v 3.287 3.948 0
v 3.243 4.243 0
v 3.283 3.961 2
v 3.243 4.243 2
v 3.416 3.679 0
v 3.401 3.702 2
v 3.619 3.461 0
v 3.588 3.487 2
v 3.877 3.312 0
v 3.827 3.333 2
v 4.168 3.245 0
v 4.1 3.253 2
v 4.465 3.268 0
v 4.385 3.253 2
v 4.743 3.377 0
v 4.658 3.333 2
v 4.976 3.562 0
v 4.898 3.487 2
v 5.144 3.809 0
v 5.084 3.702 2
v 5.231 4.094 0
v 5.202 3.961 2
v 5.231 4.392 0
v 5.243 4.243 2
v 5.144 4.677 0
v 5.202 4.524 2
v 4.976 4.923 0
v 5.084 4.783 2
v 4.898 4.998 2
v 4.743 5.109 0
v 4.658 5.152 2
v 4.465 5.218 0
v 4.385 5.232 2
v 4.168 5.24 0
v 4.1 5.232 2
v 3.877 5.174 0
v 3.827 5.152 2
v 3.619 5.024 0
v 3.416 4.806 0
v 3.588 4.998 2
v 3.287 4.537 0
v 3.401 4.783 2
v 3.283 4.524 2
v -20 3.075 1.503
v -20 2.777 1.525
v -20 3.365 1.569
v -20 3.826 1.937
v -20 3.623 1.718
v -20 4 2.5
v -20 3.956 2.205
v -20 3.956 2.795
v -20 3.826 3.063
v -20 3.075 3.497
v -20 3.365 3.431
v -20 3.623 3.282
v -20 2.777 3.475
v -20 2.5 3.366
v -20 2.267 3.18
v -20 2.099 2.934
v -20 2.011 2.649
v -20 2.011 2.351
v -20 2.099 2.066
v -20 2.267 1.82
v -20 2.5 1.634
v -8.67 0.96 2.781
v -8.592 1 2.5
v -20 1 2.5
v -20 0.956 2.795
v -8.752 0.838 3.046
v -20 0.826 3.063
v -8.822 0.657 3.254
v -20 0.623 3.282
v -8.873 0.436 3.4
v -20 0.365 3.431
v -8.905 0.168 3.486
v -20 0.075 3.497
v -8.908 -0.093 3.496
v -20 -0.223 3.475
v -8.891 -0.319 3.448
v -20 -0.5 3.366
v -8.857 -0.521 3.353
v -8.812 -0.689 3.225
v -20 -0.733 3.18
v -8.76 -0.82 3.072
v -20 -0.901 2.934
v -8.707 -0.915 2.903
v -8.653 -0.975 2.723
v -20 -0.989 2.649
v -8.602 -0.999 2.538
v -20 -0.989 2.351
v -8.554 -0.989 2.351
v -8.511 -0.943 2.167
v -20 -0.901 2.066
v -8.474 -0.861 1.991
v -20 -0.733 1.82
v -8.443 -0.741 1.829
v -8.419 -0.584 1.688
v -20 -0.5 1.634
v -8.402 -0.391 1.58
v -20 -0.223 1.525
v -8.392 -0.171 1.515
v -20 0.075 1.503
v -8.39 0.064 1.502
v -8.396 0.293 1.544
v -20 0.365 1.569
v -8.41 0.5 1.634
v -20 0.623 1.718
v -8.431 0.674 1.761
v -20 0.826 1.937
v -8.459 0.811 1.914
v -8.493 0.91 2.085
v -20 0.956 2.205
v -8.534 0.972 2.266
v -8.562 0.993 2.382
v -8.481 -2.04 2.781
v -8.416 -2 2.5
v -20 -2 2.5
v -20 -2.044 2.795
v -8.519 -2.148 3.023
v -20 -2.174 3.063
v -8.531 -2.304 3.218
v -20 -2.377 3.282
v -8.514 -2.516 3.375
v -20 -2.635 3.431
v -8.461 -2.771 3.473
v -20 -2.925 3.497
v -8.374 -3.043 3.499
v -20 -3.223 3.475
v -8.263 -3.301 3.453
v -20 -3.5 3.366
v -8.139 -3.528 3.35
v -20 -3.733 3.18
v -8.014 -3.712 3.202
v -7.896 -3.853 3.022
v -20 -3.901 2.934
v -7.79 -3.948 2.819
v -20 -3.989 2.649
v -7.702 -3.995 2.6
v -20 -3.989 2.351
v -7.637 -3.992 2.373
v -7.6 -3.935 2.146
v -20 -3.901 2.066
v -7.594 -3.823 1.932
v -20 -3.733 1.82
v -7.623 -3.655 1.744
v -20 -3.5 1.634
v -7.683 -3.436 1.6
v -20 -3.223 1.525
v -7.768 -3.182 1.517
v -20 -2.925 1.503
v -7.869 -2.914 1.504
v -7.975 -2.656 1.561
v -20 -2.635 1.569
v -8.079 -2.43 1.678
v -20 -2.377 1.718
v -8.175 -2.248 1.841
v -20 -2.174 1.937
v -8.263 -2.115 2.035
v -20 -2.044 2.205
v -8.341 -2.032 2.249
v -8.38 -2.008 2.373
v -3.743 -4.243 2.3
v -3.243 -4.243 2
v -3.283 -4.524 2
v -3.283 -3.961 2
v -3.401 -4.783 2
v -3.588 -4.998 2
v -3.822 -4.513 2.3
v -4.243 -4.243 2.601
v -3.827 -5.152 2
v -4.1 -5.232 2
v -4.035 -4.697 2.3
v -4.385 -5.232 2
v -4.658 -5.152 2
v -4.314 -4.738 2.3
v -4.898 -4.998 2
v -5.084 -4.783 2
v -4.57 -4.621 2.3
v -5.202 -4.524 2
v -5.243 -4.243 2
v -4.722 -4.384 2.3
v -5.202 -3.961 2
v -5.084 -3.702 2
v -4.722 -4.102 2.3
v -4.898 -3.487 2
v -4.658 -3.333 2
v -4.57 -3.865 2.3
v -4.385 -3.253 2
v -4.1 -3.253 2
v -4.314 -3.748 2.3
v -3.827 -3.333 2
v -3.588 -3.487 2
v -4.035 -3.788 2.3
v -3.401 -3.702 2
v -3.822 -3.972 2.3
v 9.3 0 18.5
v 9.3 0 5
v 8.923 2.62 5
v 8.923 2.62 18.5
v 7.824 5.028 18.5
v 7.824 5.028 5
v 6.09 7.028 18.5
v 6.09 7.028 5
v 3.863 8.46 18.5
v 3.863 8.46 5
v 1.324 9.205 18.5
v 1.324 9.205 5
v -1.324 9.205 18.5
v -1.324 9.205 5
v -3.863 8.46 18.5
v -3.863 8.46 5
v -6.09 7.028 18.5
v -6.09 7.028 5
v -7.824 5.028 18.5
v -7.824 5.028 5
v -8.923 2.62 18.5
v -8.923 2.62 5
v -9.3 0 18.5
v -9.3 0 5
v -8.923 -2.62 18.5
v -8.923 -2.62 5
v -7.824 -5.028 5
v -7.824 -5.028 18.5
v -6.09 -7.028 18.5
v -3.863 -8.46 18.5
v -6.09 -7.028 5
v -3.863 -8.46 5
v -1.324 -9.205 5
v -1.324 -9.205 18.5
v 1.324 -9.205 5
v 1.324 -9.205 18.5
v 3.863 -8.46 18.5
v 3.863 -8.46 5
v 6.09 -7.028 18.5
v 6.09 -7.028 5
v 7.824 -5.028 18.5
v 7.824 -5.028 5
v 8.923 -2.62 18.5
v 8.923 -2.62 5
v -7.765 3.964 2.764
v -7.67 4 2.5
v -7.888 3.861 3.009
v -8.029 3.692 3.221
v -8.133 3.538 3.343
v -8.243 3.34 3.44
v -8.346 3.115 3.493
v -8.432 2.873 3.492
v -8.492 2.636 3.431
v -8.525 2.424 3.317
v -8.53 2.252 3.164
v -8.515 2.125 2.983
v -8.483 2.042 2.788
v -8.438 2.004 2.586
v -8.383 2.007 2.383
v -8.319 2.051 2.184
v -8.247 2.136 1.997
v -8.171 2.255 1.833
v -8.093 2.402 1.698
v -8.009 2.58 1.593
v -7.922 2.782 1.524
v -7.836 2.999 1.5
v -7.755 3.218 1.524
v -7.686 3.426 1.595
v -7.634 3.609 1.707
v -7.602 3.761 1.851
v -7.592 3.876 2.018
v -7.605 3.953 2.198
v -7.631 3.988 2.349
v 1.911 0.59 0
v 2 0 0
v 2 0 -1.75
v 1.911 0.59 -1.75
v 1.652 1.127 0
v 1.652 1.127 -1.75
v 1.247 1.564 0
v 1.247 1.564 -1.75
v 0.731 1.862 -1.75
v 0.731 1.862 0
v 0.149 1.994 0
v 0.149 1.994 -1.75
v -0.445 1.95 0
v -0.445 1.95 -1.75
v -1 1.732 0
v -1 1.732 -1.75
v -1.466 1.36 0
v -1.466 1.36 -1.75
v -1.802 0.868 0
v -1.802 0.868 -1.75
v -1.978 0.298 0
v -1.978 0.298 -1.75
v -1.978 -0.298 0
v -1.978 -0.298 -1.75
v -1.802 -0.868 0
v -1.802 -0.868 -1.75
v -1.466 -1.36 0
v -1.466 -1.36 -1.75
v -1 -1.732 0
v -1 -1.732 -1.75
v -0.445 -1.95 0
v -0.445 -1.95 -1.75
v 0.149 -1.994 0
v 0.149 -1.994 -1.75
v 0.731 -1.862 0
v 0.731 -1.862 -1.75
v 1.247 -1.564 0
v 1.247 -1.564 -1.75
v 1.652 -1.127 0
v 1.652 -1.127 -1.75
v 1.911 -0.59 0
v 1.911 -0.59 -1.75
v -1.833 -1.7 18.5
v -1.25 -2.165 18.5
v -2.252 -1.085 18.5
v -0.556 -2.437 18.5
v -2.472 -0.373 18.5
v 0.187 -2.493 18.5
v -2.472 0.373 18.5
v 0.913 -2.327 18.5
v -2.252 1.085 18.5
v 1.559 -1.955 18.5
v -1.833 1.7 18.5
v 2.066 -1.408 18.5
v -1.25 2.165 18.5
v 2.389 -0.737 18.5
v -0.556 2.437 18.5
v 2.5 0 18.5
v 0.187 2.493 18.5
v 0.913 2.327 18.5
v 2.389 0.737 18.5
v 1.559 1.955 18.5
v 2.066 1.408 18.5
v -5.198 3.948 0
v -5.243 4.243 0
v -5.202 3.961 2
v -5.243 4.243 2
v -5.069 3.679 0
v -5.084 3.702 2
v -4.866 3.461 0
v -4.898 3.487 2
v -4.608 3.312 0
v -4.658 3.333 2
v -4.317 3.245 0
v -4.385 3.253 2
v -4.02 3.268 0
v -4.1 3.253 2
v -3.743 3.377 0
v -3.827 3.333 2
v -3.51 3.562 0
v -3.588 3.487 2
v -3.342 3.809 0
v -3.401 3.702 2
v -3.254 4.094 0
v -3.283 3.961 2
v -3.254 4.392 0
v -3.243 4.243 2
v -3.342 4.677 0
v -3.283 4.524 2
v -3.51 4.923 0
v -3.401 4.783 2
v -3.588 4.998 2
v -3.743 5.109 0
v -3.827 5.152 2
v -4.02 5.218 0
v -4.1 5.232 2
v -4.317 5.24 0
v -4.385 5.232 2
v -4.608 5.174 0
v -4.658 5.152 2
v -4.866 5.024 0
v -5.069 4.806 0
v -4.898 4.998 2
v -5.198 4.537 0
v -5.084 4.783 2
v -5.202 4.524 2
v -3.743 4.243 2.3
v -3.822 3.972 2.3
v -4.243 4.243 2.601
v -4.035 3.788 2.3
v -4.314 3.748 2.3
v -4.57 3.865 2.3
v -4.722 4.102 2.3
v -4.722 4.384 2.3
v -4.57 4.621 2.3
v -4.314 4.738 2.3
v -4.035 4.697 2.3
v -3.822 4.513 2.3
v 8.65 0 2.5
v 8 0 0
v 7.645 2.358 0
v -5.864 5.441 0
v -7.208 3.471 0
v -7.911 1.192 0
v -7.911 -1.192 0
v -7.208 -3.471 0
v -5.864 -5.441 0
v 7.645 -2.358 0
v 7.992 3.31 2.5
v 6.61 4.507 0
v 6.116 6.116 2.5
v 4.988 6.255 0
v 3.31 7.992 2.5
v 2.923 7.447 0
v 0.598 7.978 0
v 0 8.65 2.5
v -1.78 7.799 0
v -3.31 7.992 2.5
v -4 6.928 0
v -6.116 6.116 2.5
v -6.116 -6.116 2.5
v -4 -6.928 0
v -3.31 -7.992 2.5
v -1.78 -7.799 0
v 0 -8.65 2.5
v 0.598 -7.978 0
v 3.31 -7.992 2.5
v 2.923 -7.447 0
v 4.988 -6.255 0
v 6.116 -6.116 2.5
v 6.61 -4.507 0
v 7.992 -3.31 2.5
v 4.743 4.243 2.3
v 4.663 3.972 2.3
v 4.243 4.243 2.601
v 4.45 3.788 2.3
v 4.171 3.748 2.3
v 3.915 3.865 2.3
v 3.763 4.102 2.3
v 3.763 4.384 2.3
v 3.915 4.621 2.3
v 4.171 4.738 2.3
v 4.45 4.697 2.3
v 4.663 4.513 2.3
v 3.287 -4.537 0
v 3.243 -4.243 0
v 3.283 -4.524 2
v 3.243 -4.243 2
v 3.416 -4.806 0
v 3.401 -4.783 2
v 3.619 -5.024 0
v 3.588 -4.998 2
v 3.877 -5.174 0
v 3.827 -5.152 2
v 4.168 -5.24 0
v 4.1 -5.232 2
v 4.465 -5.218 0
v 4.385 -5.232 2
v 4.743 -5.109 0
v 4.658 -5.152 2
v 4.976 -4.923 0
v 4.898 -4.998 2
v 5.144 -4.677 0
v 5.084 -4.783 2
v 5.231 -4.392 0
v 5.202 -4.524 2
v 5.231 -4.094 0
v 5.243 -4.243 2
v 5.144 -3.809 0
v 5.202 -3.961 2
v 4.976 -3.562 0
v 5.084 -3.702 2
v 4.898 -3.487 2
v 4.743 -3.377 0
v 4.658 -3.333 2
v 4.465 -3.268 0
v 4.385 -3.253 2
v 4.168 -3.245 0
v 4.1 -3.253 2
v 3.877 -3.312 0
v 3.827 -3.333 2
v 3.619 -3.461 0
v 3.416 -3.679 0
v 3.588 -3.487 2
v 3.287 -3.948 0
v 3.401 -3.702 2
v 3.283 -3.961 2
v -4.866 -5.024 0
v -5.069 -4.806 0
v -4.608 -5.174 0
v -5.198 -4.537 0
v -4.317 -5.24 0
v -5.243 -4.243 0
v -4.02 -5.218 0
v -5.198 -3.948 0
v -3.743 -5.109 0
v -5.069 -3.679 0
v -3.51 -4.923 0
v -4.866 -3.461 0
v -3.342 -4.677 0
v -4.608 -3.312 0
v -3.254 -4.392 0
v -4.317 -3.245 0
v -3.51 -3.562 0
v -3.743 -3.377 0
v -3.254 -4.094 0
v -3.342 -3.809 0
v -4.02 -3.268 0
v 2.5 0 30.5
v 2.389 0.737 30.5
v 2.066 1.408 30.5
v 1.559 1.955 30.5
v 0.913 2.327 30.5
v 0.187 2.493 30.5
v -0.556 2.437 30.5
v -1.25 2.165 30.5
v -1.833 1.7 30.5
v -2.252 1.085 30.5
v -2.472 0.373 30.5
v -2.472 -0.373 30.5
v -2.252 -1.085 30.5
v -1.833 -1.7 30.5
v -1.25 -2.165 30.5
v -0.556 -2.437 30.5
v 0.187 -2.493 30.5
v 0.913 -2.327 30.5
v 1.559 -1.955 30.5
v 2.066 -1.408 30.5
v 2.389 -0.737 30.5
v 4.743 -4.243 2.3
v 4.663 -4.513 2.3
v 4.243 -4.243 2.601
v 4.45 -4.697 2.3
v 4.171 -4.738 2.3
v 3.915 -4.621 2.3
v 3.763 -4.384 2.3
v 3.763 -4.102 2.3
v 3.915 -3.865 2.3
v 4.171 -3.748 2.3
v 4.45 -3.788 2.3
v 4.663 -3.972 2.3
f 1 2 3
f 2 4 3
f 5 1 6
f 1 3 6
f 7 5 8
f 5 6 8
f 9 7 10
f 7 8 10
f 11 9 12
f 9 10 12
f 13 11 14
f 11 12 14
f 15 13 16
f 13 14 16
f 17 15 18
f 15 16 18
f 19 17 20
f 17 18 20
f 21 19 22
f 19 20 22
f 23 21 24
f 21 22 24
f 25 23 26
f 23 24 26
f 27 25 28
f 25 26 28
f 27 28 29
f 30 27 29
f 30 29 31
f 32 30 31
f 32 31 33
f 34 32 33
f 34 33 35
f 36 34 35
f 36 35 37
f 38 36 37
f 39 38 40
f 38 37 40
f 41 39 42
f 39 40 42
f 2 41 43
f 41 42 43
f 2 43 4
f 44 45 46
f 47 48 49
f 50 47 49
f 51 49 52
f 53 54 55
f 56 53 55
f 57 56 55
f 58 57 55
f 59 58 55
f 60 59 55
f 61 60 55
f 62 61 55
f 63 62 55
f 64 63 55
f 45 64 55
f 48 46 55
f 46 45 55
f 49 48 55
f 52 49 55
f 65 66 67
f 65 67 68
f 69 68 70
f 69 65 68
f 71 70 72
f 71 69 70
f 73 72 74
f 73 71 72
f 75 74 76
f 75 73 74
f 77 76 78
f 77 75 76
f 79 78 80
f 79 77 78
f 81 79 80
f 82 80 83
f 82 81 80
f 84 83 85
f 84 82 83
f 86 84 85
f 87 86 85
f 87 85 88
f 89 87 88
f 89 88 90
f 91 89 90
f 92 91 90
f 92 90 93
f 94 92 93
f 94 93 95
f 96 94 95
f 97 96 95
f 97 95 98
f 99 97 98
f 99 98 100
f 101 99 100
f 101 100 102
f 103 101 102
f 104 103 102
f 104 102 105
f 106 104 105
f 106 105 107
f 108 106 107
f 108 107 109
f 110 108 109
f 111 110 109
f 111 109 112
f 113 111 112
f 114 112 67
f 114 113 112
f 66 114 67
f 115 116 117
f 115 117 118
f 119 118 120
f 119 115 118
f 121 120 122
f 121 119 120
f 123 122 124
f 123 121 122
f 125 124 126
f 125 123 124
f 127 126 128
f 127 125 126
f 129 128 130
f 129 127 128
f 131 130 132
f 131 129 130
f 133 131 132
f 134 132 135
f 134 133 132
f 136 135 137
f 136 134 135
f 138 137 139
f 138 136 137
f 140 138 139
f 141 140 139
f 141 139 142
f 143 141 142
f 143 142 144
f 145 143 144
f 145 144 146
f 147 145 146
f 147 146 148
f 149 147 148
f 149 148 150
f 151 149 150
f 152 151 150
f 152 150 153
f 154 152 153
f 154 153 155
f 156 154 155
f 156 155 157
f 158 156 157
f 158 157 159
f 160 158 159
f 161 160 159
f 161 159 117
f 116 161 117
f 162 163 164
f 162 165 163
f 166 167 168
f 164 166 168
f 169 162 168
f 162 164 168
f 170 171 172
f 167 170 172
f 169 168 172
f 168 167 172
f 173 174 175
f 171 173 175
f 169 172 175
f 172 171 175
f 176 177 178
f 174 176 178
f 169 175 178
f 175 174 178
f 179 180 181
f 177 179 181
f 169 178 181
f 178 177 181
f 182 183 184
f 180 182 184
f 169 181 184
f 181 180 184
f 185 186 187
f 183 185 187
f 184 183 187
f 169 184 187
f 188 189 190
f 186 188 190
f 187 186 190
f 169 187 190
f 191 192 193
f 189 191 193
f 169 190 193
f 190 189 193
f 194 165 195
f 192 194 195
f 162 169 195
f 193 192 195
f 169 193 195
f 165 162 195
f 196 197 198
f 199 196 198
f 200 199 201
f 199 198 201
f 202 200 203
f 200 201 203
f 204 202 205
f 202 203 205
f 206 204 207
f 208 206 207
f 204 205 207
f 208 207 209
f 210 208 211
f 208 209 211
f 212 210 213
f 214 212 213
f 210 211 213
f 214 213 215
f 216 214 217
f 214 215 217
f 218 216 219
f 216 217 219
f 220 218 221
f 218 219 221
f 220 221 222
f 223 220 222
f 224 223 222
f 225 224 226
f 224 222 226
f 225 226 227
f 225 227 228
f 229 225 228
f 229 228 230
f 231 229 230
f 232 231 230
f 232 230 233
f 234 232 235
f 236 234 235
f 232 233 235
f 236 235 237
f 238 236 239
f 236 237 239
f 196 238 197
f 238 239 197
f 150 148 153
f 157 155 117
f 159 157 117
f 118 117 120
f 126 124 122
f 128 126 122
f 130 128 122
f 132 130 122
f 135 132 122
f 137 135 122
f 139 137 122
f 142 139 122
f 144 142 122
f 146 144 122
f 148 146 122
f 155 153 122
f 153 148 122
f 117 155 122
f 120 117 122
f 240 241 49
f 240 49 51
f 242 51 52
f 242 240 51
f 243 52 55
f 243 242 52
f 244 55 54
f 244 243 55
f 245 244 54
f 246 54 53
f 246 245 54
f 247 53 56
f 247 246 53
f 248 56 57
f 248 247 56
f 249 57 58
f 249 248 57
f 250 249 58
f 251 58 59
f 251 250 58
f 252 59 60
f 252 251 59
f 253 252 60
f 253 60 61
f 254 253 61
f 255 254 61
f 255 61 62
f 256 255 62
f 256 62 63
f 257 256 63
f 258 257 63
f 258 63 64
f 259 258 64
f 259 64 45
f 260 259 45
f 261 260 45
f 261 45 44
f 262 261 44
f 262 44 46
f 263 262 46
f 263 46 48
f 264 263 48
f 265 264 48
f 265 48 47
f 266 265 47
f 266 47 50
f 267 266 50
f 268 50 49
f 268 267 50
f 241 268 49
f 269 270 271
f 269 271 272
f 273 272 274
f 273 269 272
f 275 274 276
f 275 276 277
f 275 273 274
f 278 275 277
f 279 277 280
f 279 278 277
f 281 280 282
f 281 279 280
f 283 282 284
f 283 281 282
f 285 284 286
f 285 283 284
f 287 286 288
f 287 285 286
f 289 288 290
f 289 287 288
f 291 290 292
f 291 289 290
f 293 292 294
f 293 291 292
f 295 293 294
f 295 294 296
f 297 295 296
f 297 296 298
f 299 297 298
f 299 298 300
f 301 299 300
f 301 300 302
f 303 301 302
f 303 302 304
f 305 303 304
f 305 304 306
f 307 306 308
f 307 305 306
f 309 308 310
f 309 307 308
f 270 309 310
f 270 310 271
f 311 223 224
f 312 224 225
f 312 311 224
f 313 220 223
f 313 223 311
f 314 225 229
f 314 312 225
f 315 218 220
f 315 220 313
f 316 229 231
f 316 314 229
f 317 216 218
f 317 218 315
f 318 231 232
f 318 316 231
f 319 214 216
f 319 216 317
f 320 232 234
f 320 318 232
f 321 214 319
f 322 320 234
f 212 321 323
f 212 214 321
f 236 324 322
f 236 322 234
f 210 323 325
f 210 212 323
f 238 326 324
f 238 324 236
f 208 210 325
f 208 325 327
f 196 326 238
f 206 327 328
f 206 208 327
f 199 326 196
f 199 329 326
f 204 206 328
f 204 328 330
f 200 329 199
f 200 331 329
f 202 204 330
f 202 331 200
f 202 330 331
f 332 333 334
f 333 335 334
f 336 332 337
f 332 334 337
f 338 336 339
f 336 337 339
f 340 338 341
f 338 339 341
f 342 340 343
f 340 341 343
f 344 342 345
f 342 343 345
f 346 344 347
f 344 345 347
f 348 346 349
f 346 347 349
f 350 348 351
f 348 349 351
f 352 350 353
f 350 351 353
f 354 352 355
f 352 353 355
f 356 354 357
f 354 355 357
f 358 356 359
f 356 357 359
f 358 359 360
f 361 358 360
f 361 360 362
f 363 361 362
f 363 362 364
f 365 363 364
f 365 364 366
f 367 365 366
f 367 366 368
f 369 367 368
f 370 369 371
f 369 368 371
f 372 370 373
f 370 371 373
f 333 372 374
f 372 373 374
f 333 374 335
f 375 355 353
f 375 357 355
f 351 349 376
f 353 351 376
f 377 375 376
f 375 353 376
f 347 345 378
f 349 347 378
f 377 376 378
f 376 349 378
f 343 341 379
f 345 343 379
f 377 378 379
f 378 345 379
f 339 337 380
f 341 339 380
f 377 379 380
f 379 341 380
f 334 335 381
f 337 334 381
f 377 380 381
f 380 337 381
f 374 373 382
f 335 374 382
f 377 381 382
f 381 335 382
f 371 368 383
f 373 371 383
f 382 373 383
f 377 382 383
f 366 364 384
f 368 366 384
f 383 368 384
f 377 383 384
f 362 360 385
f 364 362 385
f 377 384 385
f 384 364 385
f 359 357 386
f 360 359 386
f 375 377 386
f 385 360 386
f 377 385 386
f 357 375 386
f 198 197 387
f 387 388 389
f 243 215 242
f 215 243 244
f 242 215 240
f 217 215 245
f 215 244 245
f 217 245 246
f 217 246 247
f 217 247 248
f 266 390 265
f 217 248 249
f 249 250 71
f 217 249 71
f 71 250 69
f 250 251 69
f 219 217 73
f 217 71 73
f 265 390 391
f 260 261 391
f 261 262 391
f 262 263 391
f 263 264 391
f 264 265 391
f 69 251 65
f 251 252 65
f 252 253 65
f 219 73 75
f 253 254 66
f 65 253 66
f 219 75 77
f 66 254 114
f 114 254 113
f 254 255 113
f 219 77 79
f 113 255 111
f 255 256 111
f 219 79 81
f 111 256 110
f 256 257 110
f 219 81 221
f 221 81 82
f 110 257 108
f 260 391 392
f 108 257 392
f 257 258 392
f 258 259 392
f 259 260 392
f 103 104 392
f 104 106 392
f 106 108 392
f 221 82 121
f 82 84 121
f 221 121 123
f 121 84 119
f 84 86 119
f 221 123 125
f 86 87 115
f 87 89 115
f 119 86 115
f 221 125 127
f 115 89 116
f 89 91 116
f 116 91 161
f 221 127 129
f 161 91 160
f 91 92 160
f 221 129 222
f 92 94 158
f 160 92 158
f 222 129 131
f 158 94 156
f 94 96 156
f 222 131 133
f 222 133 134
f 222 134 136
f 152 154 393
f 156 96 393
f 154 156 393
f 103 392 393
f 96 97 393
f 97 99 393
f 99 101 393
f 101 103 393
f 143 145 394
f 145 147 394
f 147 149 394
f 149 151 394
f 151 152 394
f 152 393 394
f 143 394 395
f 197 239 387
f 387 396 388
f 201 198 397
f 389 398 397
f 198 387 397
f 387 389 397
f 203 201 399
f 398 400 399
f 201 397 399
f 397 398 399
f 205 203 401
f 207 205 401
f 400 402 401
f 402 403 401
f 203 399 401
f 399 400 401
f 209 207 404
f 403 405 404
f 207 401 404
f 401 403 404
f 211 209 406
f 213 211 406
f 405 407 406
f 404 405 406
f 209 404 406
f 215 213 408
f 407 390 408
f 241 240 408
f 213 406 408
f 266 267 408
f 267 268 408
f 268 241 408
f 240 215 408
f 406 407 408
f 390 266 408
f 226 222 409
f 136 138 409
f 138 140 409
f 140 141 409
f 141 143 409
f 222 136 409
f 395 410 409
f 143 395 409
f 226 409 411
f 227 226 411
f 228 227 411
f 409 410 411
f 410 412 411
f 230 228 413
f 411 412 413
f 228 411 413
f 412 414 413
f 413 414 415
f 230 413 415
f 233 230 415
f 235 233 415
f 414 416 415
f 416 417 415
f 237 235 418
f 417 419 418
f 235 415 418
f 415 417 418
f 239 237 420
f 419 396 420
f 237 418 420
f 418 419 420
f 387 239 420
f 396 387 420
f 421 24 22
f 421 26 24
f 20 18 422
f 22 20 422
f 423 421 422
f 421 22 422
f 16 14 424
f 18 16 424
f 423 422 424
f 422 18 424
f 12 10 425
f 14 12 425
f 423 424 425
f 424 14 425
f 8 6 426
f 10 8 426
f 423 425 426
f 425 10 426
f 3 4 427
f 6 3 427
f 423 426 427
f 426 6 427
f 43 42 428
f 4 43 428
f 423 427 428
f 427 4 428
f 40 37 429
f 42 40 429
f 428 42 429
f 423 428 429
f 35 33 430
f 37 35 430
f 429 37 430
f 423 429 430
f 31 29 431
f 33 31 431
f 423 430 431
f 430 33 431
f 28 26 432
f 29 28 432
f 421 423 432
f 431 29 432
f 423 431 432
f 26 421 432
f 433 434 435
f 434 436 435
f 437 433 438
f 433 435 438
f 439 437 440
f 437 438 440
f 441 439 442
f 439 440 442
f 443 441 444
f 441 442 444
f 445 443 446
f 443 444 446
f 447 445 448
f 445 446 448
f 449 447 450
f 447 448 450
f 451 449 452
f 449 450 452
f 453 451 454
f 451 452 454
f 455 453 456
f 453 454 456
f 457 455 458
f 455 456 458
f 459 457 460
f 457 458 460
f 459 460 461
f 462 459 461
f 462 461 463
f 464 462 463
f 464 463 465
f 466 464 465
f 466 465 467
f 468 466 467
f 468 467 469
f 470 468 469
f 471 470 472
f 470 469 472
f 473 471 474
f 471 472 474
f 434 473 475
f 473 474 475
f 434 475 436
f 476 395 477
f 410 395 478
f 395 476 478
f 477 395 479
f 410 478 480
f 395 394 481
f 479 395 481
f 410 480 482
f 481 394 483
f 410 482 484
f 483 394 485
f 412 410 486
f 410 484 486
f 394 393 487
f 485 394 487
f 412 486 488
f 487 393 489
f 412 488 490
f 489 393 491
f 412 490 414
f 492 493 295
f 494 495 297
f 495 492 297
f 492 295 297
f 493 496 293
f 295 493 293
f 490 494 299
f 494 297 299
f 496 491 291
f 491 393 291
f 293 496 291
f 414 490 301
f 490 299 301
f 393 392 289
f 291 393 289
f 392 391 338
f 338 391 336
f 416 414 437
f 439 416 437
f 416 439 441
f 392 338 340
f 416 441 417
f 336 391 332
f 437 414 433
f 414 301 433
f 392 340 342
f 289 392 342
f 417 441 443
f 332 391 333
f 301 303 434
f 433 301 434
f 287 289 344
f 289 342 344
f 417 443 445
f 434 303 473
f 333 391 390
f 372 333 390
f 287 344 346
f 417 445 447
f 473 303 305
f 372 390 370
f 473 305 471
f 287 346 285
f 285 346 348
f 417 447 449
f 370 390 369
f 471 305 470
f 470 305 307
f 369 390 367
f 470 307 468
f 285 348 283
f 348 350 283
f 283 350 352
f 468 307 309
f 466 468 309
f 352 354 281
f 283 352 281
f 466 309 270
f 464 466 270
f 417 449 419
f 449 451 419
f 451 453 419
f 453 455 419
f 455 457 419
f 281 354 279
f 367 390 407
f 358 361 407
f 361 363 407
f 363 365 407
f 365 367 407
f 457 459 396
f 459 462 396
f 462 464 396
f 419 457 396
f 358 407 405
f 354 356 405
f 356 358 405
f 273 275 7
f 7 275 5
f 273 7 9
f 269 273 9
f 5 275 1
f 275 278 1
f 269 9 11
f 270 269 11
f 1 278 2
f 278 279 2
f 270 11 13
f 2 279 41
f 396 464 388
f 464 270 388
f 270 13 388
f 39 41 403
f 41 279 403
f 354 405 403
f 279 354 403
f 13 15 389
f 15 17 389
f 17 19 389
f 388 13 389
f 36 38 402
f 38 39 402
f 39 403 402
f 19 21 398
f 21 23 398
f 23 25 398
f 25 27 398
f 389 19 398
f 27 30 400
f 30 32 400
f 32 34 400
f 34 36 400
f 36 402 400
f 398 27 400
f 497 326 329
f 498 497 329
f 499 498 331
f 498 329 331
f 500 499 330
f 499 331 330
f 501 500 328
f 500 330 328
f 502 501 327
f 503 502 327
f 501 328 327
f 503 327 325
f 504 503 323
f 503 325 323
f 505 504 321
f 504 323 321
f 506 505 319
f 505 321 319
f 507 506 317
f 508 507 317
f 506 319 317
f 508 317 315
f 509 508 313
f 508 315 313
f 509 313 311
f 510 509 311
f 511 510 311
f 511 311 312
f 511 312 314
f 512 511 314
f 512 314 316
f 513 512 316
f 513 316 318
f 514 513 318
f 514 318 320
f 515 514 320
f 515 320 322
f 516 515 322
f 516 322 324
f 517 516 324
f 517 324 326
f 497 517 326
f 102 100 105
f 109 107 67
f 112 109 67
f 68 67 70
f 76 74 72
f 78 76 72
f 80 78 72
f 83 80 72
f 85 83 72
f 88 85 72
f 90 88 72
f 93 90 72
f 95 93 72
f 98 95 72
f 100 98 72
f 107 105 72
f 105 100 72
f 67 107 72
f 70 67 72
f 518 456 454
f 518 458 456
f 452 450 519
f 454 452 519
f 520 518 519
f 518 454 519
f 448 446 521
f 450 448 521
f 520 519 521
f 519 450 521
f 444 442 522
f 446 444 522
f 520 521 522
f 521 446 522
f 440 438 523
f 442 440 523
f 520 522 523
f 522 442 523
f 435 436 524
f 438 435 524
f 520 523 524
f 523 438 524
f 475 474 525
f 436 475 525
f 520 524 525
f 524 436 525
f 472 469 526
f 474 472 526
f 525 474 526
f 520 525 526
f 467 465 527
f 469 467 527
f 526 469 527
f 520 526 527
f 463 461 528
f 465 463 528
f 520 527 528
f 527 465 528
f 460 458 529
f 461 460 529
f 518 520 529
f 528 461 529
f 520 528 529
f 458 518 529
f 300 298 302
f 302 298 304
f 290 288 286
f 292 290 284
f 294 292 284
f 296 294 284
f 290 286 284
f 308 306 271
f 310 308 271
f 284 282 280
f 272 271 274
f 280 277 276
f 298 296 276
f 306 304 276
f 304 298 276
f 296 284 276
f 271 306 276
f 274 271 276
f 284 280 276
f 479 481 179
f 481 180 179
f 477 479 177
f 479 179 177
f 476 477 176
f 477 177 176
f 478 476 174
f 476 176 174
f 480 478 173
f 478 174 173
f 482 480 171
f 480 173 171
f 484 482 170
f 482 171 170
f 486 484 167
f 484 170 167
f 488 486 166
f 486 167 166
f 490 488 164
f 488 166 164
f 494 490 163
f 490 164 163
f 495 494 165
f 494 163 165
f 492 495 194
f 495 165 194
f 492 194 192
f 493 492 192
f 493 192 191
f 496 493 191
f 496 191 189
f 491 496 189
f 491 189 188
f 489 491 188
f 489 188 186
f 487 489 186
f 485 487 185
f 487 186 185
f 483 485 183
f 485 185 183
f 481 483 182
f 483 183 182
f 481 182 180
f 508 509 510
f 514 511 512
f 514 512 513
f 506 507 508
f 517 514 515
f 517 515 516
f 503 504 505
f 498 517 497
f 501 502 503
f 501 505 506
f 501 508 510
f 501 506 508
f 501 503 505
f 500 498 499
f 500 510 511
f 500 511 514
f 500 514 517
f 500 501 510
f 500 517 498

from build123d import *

# Parameters (mm, degrees)
F0_R      = 9.3
F4_DEPTH  = 18.5
F2_R      = 2.5
F5_DEPTH  = 30.5
F3_R      = 2
F6_DEPTH  = 1.75
F7_SIZE2  = 1.3
F7_SIZE   = 5
F8_R      = 1
F9_DEPTH  = 20
F10_D     = 2
F10_DEPTH = 2
F10_TIP   = 0.600860619


with BuildPart() as f4:
    # F0 (on Top) → F4 (new body)
    with BuildSketch(Plane.XY):
        Circle(F0_R)
    extrude(amount=F4_DEPTH)

    # F2 (on Top) → F5 (join)
    with BuildSketch(Plane.XY):
        Circle(F2_R)
    extrude(amount=F5_DEPTH)

    # F3 (on Top) → F6 (join)
    with BuildSketch(Plane.XY):
        Circle(F3_R)
    extrude(amount=-F6_DEPTH)

    # F7
    f7_edges = [f4.edges().sort_by_distance(p)[0] for p in [
        (-9.3, 0, 0),
    ]]
    f7_side = f4.faces().sort_by_distance((-9.3, 0, 9.25))[0]
    chamfer(f7_edges, length=F7_SIZE, length2=F7_SIZE2, reference=f7_side)

    # F8 (on Right) → F9 (join)
    with BuildSketch(Plane.YZ):
        with Locations((0, 2.5)):
            Circle(F8_R)
        with Locations((-3, 2.5)):
            Circle(F8_R)
        with Locations((3, 2.5)):
            Circle(F8_R)
    extrude(amount=-F9_DEPTH)

    # F10
    with Locations(Plane(origin=(0, 0, 0), x_dir=(1, 0, 0), z_dir=(0, 0, -1))):
        with Locations((-4.2426406871, -4.2426406871), (-4.2426406871, 4.2426406871), (4.2426406871, 4.2426406871), (4.2426406871, -4.2426406871)):
            Hole(F10_D / 2, depth=F10_DEPTH)
            with Locations((0, 0, -(F10_DEPTH + F10_TIP / 2))):  # 118° drill point
                Cone(0, F10_D / 2, F10_TIP, mode=Mode.SUBTRACT)


solid = f4.part
